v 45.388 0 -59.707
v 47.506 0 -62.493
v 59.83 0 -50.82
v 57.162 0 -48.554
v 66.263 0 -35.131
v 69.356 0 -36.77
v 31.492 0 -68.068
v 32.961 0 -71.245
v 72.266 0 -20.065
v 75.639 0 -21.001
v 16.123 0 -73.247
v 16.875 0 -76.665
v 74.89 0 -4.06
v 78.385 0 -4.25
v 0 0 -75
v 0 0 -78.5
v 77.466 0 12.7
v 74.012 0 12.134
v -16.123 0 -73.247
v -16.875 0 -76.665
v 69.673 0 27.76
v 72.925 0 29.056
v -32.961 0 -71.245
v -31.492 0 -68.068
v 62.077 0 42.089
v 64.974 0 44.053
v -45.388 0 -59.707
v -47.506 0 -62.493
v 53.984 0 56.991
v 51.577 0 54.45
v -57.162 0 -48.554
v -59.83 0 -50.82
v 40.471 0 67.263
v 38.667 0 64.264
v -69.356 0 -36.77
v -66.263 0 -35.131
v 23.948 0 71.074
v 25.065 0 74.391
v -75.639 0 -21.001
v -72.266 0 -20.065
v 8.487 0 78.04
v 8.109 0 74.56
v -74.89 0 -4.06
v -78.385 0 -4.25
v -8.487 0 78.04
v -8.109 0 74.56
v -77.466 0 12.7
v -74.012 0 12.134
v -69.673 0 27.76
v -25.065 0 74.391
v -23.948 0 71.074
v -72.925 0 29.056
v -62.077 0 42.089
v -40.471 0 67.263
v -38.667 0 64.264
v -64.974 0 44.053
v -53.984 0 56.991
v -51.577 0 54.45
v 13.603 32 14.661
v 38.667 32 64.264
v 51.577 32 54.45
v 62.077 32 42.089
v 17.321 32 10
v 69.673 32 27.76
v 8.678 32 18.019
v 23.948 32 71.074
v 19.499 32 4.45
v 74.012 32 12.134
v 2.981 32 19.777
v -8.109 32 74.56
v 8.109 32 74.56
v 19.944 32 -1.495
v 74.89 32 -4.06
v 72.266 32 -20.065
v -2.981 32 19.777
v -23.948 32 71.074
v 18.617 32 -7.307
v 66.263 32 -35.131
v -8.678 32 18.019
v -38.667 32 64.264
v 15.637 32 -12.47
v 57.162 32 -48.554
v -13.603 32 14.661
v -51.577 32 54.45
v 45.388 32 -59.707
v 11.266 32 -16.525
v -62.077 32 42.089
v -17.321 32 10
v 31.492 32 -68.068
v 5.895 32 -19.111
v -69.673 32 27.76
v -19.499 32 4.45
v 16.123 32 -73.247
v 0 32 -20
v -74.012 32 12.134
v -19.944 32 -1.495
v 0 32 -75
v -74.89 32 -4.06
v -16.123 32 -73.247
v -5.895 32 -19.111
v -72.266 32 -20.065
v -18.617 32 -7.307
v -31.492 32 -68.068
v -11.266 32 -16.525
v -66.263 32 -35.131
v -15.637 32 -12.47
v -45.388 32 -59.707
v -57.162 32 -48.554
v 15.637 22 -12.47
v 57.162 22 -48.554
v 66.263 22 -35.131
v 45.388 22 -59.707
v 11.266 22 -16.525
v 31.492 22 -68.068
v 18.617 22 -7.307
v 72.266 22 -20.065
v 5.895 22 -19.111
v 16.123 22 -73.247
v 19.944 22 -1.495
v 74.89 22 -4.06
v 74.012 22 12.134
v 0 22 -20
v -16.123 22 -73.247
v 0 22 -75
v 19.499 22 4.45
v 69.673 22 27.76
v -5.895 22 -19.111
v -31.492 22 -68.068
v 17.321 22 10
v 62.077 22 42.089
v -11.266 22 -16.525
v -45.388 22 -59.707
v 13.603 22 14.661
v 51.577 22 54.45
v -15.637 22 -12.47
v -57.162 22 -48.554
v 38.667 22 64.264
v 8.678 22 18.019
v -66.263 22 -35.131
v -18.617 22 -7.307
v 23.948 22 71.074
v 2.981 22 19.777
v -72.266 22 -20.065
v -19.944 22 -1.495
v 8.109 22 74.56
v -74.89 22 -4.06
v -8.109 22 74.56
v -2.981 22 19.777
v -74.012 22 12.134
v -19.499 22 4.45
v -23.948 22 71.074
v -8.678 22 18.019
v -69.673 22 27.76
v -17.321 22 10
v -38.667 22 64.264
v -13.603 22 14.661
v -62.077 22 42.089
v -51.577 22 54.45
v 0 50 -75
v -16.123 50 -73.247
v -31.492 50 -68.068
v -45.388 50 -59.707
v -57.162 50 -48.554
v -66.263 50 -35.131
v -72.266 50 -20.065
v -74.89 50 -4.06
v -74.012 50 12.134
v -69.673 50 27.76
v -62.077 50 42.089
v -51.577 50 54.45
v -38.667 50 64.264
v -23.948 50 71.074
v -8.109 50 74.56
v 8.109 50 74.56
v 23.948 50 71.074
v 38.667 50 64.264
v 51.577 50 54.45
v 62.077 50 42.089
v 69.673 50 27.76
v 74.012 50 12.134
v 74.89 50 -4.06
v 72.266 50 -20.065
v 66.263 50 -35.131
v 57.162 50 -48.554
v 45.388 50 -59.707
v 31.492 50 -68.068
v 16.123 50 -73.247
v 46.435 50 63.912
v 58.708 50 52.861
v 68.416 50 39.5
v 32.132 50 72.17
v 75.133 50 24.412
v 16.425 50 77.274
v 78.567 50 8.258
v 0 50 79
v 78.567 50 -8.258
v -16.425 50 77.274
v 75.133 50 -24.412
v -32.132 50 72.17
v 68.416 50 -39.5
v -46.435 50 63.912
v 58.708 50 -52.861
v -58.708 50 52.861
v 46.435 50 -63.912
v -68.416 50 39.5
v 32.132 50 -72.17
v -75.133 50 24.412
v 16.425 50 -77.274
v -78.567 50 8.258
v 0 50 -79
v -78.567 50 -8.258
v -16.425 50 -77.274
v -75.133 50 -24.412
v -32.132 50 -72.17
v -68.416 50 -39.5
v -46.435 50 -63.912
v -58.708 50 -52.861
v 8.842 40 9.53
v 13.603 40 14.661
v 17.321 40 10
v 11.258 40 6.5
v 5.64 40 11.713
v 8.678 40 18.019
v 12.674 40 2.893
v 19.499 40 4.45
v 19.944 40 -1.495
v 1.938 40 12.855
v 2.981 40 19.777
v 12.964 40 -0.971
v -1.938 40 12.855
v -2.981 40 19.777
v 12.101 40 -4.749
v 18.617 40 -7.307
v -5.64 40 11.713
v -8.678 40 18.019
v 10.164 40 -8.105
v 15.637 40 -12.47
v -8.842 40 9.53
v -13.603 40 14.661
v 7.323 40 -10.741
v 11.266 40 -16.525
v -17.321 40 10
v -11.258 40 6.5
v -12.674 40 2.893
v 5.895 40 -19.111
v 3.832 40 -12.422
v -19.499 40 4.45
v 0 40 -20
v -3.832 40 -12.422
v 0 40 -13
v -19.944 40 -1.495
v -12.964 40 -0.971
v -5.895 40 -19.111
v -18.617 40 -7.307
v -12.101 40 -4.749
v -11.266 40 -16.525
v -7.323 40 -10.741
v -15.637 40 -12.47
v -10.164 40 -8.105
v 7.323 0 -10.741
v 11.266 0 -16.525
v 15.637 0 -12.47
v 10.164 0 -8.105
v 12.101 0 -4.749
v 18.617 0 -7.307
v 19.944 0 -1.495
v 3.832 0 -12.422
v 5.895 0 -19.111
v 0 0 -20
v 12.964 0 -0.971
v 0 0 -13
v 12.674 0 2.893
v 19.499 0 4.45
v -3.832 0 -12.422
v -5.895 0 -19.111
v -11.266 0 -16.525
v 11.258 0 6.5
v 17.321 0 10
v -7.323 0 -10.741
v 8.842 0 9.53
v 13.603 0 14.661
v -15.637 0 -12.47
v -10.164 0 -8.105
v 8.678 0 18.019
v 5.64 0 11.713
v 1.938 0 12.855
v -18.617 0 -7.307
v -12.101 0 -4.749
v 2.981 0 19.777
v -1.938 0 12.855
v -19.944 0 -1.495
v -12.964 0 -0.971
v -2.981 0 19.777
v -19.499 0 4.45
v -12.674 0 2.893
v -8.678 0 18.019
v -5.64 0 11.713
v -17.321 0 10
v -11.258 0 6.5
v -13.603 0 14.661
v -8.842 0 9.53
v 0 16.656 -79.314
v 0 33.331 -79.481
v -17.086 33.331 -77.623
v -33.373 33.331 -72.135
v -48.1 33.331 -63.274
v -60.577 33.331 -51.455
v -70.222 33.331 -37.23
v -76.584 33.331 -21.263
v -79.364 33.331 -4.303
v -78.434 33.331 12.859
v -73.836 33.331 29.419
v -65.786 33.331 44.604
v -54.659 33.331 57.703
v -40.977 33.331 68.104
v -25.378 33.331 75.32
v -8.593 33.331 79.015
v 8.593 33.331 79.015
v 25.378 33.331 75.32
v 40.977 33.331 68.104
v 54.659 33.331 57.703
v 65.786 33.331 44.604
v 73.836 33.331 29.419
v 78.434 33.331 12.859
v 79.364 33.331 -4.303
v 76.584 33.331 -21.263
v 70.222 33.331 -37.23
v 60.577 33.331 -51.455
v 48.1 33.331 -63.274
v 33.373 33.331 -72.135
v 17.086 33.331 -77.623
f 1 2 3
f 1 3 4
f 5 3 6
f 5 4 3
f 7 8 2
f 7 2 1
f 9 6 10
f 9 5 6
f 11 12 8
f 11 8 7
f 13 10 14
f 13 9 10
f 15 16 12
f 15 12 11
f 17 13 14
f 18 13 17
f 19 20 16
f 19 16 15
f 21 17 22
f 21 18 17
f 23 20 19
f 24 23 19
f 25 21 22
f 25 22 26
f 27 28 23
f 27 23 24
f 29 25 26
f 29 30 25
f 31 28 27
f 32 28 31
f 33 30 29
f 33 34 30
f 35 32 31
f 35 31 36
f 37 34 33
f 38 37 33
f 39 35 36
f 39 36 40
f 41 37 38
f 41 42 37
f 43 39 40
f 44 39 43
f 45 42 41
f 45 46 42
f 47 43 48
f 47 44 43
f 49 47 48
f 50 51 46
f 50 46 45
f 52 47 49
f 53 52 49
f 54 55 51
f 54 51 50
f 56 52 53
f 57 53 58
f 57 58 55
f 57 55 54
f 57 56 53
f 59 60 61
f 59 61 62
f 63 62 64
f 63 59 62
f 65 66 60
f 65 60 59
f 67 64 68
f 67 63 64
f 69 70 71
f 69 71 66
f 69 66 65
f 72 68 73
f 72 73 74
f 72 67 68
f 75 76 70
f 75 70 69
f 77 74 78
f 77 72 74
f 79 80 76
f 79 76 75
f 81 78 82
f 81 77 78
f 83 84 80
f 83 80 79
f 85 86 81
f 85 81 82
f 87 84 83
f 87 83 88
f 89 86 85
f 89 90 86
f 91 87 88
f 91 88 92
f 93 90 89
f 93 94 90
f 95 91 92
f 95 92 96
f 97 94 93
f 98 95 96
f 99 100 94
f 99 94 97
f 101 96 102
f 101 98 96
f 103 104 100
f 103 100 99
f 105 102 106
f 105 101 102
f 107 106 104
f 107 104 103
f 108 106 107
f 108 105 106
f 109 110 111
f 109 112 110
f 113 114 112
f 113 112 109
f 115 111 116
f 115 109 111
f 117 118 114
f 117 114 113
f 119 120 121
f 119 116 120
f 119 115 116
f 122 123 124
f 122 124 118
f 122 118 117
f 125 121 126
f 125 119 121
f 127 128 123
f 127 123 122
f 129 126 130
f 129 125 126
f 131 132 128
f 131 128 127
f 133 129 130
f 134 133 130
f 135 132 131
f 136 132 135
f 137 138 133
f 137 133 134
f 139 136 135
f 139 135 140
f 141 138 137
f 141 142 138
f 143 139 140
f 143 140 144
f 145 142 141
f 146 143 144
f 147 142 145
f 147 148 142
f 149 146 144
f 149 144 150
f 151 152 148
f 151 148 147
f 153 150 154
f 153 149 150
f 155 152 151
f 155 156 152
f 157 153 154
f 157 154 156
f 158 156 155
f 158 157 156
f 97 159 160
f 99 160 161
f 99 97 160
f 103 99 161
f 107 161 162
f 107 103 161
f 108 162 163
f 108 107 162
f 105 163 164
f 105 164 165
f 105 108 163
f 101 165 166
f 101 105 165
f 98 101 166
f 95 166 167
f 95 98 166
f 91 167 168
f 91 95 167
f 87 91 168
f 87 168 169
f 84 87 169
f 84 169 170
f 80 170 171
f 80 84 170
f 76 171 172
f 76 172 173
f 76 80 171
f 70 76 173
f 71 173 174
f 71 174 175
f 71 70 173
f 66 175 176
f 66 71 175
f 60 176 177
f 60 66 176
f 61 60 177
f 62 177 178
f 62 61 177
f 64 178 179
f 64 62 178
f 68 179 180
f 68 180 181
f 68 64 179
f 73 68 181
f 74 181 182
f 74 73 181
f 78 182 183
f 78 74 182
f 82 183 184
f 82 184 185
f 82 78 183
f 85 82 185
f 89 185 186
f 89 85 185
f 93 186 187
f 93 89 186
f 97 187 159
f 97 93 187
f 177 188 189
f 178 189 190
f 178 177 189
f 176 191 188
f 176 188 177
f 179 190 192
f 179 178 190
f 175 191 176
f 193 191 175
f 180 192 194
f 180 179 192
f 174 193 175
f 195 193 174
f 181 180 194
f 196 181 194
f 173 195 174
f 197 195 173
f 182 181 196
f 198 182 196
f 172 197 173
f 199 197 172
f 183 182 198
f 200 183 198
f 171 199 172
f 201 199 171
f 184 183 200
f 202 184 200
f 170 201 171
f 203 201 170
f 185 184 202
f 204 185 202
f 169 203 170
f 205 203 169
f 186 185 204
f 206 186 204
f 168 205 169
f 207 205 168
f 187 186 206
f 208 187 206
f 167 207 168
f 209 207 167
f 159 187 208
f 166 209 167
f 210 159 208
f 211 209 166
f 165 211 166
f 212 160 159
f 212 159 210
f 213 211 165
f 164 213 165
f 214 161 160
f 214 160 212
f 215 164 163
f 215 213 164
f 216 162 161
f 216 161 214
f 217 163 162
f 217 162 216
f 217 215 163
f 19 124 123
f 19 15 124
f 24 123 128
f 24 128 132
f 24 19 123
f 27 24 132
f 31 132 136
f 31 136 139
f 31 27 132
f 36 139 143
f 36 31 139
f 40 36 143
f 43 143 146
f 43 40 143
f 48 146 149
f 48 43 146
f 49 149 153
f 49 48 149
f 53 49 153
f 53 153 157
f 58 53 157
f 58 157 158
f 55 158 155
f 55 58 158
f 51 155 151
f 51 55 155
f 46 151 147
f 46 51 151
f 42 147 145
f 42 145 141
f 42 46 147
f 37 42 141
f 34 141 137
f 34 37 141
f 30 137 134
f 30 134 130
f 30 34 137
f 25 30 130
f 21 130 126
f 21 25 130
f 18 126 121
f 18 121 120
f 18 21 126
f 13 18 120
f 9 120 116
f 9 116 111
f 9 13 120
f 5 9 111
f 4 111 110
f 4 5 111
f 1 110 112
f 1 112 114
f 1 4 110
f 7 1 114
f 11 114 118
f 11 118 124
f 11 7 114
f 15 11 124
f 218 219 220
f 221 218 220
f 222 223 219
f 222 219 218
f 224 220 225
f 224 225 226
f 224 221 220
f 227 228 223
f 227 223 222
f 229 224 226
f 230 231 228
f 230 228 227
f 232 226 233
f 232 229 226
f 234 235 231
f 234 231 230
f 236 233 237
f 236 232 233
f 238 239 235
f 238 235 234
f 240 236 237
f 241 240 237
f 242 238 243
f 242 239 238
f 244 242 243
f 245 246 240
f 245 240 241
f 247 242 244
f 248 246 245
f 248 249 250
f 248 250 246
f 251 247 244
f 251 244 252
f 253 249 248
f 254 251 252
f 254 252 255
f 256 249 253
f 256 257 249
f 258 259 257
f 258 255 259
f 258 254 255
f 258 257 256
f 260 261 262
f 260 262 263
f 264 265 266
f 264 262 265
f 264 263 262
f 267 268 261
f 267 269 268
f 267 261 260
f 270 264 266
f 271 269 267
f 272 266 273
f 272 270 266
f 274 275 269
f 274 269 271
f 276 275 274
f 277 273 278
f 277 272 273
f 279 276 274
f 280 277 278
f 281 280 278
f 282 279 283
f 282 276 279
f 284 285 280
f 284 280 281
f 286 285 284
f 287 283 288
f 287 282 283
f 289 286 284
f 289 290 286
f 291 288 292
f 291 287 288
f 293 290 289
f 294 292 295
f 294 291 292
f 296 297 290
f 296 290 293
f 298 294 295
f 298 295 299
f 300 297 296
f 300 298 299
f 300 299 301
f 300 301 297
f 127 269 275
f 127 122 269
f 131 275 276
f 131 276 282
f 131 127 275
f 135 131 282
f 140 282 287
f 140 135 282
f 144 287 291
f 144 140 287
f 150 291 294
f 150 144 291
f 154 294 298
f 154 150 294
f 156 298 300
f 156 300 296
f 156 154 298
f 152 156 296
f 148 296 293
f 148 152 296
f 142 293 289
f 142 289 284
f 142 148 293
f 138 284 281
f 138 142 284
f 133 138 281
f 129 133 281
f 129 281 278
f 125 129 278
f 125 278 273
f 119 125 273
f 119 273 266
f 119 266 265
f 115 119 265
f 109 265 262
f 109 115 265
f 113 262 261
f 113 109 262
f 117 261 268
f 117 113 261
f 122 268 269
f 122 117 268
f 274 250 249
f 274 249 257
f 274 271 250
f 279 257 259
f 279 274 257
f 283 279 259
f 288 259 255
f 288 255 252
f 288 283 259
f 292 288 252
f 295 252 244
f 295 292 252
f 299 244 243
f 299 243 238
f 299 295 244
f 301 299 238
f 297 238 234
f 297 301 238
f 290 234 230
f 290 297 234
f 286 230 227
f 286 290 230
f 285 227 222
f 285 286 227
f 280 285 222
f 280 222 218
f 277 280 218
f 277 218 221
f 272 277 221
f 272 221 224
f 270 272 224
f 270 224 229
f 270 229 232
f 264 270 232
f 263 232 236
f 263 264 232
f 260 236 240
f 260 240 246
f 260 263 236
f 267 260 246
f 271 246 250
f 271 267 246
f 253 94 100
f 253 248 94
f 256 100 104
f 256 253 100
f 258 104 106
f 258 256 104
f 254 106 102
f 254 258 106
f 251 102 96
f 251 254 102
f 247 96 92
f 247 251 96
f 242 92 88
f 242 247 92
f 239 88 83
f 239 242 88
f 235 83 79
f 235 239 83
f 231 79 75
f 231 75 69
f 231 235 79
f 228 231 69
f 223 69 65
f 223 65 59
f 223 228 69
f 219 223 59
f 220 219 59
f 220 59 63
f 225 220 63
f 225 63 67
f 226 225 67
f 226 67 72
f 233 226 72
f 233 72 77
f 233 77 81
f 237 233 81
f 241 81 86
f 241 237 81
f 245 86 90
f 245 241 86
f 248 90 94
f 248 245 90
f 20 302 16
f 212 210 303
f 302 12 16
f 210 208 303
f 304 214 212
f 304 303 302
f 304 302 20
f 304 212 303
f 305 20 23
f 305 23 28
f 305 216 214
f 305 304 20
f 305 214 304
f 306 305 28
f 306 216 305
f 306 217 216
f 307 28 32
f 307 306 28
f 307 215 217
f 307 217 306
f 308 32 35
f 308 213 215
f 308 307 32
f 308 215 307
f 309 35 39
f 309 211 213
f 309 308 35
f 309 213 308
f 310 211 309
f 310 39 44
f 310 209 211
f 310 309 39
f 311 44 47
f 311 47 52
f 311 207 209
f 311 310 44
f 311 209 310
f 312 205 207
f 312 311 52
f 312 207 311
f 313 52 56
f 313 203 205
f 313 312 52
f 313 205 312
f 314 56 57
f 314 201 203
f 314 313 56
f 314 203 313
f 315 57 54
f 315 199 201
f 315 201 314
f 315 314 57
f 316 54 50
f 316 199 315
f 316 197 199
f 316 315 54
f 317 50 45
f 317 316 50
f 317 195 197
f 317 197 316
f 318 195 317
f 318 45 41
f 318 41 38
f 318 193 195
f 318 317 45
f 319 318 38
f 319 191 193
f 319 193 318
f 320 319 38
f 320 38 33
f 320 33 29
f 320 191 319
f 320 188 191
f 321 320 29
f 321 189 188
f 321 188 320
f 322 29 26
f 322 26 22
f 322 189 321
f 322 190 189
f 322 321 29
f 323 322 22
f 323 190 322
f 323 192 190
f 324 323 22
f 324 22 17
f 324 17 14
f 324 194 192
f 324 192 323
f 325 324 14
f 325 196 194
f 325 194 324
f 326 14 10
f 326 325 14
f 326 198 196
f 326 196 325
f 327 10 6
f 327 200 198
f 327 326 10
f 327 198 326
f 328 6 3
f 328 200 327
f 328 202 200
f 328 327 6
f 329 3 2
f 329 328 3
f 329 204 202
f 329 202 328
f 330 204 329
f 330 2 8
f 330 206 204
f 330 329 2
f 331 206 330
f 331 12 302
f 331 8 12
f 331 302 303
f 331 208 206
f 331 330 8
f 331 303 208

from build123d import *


with BuildPart() as part:
    # Esquisse1 → Révolution1 (revolve)
    with BuildSketch(Plane.XY, mode=Mode.PRIVATE) as r_volution1_sk:
        with BuildLine():
            Line((13, 40), (13, 0))
            Line((13, 0), (20, 0))
            Line((20, 0), (20, 22))
            Line((20, 22), (75, 22))
            Line((75, 22), (75, 0))
            Line((75, 0), (78.5, 0))
            ThreePointArc((78.5, 0), (79.478535178, 24.992714648), (79, 50))
            Line((79, 50), (75, 50))
            Line((75, 50), (75, 32))
            Line((75, 32), (20, 32))
            Line((20, 32), (20, 40))
            Line((20, 40), (13, 40))
        make_face()
    revolve(r_volution1_sk.sketch.rotate(Axis((0, 0, 0), (0, 1, 0)), 90), axis=Axis((0, 0, 0), (0, 1, 0)))


solid = part.part
